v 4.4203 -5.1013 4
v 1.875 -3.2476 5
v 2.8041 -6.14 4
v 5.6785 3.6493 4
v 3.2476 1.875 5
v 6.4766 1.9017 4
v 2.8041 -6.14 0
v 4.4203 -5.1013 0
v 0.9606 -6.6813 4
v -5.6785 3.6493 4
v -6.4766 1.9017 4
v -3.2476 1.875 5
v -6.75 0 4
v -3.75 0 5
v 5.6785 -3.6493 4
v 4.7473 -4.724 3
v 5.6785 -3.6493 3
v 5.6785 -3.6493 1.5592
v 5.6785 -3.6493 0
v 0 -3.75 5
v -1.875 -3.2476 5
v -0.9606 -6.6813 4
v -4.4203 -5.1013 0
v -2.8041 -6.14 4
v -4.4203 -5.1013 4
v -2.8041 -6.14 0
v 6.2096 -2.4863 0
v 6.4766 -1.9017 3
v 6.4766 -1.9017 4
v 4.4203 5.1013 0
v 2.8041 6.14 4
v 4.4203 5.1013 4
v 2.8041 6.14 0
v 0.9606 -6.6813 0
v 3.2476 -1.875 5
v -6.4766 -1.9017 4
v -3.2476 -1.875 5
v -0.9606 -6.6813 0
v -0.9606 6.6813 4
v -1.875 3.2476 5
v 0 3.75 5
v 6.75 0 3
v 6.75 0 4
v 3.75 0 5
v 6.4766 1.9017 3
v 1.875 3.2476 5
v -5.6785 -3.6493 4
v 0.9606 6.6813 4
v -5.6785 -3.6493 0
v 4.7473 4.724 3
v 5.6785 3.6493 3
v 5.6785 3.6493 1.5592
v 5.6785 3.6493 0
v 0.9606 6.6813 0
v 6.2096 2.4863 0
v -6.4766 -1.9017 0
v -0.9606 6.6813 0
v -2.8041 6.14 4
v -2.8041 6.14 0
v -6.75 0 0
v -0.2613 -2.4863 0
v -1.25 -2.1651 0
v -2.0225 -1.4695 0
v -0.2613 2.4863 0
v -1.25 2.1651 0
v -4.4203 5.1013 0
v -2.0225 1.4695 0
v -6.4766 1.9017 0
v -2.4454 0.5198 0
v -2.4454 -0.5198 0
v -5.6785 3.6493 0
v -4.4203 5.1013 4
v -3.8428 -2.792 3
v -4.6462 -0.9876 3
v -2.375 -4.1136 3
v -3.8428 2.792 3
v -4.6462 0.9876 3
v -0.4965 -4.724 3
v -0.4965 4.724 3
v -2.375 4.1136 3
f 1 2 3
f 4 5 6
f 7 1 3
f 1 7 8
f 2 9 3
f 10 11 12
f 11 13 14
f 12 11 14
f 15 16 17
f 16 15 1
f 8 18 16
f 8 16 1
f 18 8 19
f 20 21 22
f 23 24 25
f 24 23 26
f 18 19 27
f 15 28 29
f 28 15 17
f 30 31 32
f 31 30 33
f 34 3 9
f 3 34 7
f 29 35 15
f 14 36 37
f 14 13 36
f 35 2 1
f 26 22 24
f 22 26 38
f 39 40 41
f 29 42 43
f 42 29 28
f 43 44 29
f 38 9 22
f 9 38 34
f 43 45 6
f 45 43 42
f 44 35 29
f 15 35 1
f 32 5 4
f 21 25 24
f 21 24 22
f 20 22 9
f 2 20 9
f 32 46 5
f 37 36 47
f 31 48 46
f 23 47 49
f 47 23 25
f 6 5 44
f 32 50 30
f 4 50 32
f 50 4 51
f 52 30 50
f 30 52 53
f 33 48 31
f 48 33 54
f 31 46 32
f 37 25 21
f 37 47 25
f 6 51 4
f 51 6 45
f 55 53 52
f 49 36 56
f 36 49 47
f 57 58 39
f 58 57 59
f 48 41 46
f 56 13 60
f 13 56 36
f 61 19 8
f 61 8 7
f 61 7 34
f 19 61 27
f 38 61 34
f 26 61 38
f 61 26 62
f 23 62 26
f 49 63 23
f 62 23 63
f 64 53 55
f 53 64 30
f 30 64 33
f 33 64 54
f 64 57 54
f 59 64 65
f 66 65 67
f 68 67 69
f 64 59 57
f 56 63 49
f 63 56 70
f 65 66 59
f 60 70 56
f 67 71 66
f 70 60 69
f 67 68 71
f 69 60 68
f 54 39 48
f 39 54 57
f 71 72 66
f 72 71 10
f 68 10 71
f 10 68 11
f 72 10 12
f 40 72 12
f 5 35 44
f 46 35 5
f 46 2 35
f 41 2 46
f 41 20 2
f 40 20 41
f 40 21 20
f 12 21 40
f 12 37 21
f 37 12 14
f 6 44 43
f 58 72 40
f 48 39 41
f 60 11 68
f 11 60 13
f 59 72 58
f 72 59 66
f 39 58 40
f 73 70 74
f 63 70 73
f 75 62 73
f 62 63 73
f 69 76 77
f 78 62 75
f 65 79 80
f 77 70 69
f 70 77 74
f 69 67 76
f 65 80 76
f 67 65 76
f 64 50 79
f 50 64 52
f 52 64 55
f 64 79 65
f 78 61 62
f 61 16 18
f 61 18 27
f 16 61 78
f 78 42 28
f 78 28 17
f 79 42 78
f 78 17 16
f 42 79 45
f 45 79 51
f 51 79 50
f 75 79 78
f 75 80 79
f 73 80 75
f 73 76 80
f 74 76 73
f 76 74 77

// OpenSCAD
module foo(){
h = 1.2; // mm
w = 2; //mm wall

x = 9+w;
y = 10;
cube([x+w,y,w]);

translate([0,0, w + 2*h]) cube([x,y,w]);

translate([x,0,w+h]) cube([w, y, w+h+10]);

cube([w, y,w + 2*h]);
    
}


// baita screw mask 
module bar(){
    
    d1 = 5;
    d2= 9.5;
    d3= d2+4;
    h1=3;
    h2=4;
    
    module x() {
//        translate([0,0,h1]) cylinder(d=d2,h=5);
        cylinder(d1=d1,d2=d2,h=h1);
    }
    
    difference(){
       
        hull(){
        translate([0,0,h2/2]) cylinder(d=d3,h=h2,center=true);
        translate([0,0,4]) cylinder(d=d3-6,h=h2-2,center=true);
        }
        
        hull(){
            x();
            translate([10,0,0]) x();
        }
    }
}


bar();
